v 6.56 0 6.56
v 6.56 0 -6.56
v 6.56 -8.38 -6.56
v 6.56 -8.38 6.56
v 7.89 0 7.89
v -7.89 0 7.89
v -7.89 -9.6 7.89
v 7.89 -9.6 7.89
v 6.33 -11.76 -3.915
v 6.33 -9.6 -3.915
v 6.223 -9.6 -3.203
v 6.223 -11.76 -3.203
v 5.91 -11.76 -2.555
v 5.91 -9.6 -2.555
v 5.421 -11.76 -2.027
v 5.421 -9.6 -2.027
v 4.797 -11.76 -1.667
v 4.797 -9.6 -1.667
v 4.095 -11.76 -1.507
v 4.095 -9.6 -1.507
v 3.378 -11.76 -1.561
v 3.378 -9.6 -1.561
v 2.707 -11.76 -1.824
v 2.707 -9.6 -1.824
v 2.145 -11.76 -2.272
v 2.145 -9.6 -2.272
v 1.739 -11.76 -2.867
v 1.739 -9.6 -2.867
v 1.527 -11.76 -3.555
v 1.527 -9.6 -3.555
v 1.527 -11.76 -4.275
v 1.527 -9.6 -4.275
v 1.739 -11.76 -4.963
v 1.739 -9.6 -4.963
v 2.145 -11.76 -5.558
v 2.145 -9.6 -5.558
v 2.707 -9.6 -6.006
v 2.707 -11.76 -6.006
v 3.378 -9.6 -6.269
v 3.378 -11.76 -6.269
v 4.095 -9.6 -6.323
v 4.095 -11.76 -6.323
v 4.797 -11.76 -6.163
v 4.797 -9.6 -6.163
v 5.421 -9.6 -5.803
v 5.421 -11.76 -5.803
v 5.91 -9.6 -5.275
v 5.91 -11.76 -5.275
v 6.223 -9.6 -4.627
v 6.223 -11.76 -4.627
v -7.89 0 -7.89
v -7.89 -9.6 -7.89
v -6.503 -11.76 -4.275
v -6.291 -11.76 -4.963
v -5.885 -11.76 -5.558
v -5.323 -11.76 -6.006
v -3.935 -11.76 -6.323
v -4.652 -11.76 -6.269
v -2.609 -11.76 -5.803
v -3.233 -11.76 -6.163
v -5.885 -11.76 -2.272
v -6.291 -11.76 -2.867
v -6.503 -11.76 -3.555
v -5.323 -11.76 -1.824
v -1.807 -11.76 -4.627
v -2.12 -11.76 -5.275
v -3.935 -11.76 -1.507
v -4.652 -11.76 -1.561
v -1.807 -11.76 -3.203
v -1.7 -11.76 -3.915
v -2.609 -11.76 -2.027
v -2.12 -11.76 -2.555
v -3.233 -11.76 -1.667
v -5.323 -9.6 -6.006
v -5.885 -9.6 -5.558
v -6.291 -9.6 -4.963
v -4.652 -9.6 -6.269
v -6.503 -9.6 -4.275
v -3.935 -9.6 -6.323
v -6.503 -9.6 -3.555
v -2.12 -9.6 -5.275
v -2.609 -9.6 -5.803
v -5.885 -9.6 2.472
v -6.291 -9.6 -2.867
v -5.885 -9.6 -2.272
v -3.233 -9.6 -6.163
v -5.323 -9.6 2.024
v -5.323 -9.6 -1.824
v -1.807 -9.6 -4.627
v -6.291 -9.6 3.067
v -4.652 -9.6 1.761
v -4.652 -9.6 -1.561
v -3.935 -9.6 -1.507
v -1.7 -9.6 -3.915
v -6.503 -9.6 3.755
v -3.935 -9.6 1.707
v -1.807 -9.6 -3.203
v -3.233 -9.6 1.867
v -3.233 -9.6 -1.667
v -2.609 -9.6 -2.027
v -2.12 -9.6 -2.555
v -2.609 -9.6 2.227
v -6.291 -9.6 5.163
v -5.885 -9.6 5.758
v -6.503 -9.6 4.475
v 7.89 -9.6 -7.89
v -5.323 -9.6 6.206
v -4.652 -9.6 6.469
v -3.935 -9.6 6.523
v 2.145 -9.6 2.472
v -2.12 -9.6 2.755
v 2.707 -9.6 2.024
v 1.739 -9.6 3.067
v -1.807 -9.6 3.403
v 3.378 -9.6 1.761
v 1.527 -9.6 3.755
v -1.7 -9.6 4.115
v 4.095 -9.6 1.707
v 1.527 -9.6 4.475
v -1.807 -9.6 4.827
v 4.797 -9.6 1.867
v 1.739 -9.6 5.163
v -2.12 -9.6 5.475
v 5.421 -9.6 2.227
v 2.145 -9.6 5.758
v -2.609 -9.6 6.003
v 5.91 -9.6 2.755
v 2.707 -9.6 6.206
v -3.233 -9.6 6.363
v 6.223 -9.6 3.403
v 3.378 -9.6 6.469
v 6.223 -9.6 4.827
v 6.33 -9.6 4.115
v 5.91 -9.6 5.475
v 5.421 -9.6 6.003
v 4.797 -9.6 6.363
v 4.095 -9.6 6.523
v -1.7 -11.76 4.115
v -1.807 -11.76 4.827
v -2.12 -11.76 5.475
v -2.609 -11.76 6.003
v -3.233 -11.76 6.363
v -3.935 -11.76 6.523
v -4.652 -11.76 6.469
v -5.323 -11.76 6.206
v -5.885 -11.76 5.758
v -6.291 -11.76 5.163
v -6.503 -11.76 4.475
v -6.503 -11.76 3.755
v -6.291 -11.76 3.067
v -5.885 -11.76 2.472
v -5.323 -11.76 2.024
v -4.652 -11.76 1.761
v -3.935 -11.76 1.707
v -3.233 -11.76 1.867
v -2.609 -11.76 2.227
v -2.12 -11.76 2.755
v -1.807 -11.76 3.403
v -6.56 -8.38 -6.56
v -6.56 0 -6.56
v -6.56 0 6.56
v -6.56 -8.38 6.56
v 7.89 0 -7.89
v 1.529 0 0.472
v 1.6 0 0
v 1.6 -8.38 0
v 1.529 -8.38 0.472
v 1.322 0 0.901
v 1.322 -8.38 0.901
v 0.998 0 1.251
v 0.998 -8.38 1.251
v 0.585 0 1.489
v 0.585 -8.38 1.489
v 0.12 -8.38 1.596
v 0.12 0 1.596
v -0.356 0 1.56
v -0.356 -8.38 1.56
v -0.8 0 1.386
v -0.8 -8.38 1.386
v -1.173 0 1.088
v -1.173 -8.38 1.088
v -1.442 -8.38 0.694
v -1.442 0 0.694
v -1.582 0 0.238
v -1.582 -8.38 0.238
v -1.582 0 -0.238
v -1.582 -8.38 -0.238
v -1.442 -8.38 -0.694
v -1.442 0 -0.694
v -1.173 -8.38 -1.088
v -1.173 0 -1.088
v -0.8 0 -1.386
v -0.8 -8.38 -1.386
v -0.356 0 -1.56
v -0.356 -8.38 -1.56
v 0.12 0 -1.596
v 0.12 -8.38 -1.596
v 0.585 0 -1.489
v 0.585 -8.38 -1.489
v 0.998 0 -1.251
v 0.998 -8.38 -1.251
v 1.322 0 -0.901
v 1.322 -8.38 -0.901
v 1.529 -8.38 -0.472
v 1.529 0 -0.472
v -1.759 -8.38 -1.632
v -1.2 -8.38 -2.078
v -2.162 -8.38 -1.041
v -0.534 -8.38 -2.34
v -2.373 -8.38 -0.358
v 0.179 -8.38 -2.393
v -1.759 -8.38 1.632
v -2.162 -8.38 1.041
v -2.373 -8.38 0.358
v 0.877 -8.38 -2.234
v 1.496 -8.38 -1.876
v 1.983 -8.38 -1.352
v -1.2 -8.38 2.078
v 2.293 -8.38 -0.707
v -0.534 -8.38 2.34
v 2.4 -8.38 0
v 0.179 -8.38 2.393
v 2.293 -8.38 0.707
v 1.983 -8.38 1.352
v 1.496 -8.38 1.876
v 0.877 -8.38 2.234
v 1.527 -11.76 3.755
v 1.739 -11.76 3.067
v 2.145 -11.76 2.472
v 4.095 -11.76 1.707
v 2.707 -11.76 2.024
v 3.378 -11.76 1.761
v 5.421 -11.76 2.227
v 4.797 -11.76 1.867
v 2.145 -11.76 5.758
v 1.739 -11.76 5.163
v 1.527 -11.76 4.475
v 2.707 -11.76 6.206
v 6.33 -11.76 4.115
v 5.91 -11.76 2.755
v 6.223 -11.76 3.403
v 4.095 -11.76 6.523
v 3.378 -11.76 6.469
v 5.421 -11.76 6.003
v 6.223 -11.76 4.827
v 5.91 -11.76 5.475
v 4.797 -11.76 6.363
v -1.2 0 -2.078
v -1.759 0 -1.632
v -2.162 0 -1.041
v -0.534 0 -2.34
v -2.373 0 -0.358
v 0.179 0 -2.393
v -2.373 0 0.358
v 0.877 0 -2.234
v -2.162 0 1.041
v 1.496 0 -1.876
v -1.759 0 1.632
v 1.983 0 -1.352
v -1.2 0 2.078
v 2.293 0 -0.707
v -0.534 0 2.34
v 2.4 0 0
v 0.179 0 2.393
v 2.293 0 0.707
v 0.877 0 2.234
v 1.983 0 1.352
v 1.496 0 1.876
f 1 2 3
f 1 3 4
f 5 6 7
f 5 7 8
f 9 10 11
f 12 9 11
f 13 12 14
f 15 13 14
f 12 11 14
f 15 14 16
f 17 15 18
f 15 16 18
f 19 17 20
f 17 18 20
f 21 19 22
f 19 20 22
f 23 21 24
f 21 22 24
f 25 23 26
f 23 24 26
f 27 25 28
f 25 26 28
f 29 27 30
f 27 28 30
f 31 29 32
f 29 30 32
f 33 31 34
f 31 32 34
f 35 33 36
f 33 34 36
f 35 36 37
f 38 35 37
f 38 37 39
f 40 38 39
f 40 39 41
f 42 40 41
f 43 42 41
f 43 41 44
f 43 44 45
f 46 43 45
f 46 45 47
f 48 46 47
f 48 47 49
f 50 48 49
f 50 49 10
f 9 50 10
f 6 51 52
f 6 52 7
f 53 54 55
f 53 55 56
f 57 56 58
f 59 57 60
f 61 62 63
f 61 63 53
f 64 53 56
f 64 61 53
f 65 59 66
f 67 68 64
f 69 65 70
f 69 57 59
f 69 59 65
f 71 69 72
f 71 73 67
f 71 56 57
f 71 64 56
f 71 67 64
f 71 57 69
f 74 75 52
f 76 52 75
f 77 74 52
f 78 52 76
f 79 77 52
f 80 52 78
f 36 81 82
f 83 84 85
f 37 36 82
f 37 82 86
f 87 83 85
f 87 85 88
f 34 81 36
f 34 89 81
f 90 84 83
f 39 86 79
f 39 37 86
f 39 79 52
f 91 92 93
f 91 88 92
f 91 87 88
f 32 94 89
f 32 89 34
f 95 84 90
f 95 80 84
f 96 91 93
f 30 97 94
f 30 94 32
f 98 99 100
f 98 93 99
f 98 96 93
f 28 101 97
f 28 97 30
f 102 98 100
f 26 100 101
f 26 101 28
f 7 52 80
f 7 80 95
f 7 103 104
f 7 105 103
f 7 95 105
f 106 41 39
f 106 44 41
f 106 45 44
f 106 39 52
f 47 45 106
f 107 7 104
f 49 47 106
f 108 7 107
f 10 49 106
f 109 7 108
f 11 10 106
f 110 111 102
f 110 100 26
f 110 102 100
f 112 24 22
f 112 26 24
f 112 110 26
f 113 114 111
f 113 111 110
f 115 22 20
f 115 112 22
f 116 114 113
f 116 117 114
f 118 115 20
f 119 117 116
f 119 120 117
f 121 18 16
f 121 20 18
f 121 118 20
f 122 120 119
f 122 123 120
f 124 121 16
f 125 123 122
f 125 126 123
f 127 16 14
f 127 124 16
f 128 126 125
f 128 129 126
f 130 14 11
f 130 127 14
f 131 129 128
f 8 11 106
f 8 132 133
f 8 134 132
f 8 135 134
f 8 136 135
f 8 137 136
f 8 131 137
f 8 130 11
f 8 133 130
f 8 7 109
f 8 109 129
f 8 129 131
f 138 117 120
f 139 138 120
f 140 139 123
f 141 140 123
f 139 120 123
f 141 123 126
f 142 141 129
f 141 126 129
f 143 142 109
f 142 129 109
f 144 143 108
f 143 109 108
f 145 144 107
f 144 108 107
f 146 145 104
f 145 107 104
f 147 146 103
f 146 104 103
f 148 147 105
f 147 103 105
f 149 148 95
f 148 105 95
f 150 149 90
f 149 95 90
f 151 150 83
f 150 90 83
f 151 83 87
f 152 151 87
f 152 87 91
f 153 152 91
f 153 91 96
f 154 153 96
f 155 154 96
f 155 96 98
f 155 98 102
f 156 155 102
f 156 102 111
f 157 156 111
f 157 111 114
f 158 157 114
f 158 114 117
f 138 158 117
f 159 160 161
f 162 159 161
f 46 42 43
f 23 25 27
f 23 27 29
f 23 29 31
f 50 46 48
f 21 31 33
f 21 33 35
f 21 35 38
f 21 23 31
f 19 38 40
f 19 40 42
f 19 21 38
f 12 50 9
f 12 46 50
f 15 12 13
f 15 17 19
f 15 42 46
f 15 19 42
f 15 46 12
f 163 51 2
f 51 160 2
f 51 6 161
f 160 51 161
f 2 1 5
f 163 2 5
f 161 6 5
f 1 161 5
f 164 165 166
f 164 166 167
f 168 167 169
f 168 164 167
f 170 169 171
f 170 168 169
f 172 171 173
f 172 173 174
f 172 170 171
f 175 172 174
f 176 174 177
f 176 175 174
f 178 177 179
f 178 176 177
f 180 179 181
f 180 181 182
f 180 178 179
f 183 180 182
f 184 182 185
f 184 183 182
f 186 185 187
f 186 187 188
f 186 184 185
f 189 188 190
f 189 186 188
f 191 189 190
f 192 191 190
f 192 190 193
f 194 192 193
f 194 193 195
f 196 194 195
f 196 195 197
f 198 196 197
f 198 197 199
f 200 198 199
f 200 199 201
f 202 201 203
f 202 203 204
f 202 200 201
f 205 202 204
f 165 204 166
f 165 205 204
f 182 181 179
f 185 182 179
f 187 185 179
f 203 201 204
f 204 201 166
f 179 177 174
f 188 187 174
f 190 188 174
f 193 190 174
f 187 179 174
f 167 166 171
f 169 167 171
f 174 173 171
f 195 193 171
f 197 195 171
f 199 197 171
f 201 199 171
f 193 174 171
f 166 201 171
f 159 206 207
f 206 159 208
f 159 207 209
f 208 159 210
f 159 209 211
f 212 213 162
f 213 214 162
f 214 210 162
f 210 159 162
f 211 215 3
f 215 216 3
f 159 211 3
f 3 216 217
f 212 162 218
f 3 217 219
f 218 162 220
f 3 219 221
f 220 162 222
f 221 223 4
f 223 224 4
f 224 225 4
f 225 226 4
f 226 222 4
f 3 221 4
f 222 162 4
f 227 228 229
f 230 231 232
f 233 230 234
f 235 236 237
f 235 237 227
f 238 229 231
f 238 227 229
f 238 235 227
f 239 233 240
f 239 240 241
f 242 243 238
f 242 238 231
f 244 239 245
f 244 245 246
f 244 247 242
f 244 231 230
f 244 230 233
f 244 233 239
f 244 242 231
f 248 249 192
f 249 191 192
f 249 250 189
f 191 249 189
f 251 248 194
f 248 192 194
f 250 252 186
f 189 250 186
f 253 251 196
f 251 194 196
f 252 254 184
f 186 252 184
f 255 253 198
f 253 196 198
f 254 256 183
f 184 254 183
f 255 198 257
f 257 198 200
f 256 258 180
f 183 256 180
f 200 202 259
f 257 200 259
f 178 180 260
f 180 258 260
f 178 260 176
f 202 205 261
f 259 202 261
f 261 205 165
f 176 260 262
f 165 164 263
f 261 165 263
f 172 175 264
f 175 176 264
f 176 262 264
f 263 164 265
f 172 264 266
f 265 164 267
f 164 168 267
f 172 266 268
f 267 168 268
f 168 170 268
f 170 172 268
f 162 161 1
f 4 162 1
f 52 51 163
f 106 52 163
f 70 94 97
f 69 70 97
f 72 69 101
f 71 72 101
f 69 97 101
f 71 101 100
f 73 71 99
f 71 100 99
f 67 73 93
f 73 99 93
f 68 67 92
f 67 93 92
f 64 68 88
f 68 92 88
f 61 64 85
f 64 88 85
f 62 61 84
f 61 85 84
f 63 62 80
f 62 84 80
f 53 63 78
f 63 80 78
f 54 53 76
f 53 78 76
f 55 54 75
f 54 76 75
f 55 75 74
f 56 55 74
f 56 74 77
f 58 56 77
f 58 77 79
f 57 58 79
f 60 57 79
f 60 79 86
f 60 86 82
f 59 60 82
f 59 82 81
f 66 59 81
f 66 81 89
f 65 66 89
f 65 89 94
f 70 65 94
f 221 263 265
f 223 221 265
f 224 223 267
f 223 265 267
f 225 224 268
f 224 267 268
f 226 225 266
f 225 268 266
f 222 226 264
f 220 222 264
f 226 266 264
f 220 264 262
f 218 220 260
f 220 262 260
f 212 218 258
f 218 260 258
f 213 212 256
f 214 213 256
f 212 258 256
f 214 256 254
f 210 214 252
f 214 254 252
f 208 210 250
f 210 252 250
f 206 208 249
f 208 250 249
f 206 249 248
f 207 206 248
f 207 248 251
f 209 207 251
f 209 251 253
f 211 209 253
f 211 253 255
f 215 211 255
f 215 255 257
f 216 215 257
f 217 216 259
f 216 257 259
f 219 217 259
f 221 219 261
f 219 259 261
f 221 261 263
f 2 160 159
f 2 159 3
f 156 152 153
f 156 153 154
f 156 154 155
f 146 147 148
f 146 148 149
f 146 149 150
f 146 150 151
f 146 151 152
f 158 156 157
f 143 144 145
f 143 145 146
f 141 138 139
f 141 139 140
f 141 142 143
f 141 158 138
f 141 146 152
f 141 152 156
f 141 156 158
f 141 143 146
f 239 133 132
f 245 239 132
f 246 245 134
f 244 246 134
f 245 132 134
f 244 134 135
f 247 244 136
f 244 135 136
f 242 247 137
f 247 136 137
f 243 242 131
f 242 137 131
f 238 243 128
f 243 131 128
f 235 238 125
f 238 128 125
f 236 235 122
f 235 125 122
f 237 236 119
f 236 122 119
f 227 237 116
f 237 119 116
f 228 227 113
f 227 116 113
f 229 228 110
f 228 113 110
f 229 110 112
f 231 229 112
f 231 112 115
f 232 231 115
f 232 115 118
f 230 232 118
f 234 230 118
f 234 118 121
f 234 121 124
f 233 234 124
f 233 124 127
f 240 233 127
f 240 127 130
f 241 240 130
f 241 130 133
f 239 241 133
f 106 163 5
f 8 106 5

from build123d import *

# Parameters (mm, degrees)
F0_W     = 15.78
F0_H     = 15.78
F0_R     = 2.415
F1_DEPTH = 9.6
F2_DEPTH = 11.76
F3_W     = 13.12
F3_H     = 13.12
F3_R     = 2.415
F3_R_2   = 2.4
F4_DEPTH = 8.38
F3_R_3   = 1.6
F5_DEPTH = 8.38


with BuildPart() as f1:
    # F0 (on Front) → F1 (new body)
    with BuildSketch(Plane.XZ):
        Rectangle(F0_W, F0_H)
        with Locations((-4.115, -3.915)):
            Circle(F0_R, mode=Mode.SUBTRACT)
        with Locations((3.915, -3.915)):
            Circle(F0_R, mode=Mode.SUBTRACT)
        with Locations((-4.115, 4.115)):
            Circle(F0_R, mode=Mode.SUBTRACT)
        with Locations((3.915, 4.115)):
            Circle(F0_R, mode=Mode.SUBTRACT)
    extrude(amount=F1_DEPTH)

    # F0 (on Front) → F2 (join)
    with BuildSketch(Plane.XZ):
        with Locations((-4.115, 4.115)):
            Circle(F0_R)
        with Locations((3.915, 4.115)):
            Circle(F0_R)
        with Locations((-4.115, -3.915)):
            Circle(F0_R)
        with Locations((3.915, -3.915)):
            Circle(F0_R)
    extrude(amount=F2_DEPTH)

    # F3 (on face) → F4 (cut)
    with BuildSketch(Plane.XZ):
        Rectangle(F3_W, F3_H)
        with Locations((-4.115, -3.915)):
            Circle(F3_R, mode=Mode.SUBTRACT)
        with Locations((3.915, -3.915)):
            Circle(F3_R, mode=Mode.SUBTRACT)
        with Locations((-4.115, 4.115)):
            Circle(F3_R, mode=Mode.SUBTRACT)
        Circle(F3_R_2, mode=Mode.SUBTRACT)
        with Locations((3.915, 4.115)):
            Circle(F3_R, mode=Mode.SUBTRACT)
    extrude(amount=F4_DEPTH, mode=Mode.SUBTRACT)

    # F0 (on Front) + F3 (on face) → F5 (cut)
    with BuildSketch(Plane.XZ):
        with Locations((3.915, 4.115)):
            Circle(F0_R)
        with Locations((-4.115, 4.115)):
            Circle(F0_R)
        with Locations((3.915, -3.915)):
            Circle(F0_R)
        with Locations((-4.115, -3.915)):
            Circle(F0_R)
    with BuildSketch(Plane.XZ):
        Circle(F3_R_3)
    extrude(amount=F5_DEPTH, mode=Mode.SUBTRACT)


solid = f1.part
